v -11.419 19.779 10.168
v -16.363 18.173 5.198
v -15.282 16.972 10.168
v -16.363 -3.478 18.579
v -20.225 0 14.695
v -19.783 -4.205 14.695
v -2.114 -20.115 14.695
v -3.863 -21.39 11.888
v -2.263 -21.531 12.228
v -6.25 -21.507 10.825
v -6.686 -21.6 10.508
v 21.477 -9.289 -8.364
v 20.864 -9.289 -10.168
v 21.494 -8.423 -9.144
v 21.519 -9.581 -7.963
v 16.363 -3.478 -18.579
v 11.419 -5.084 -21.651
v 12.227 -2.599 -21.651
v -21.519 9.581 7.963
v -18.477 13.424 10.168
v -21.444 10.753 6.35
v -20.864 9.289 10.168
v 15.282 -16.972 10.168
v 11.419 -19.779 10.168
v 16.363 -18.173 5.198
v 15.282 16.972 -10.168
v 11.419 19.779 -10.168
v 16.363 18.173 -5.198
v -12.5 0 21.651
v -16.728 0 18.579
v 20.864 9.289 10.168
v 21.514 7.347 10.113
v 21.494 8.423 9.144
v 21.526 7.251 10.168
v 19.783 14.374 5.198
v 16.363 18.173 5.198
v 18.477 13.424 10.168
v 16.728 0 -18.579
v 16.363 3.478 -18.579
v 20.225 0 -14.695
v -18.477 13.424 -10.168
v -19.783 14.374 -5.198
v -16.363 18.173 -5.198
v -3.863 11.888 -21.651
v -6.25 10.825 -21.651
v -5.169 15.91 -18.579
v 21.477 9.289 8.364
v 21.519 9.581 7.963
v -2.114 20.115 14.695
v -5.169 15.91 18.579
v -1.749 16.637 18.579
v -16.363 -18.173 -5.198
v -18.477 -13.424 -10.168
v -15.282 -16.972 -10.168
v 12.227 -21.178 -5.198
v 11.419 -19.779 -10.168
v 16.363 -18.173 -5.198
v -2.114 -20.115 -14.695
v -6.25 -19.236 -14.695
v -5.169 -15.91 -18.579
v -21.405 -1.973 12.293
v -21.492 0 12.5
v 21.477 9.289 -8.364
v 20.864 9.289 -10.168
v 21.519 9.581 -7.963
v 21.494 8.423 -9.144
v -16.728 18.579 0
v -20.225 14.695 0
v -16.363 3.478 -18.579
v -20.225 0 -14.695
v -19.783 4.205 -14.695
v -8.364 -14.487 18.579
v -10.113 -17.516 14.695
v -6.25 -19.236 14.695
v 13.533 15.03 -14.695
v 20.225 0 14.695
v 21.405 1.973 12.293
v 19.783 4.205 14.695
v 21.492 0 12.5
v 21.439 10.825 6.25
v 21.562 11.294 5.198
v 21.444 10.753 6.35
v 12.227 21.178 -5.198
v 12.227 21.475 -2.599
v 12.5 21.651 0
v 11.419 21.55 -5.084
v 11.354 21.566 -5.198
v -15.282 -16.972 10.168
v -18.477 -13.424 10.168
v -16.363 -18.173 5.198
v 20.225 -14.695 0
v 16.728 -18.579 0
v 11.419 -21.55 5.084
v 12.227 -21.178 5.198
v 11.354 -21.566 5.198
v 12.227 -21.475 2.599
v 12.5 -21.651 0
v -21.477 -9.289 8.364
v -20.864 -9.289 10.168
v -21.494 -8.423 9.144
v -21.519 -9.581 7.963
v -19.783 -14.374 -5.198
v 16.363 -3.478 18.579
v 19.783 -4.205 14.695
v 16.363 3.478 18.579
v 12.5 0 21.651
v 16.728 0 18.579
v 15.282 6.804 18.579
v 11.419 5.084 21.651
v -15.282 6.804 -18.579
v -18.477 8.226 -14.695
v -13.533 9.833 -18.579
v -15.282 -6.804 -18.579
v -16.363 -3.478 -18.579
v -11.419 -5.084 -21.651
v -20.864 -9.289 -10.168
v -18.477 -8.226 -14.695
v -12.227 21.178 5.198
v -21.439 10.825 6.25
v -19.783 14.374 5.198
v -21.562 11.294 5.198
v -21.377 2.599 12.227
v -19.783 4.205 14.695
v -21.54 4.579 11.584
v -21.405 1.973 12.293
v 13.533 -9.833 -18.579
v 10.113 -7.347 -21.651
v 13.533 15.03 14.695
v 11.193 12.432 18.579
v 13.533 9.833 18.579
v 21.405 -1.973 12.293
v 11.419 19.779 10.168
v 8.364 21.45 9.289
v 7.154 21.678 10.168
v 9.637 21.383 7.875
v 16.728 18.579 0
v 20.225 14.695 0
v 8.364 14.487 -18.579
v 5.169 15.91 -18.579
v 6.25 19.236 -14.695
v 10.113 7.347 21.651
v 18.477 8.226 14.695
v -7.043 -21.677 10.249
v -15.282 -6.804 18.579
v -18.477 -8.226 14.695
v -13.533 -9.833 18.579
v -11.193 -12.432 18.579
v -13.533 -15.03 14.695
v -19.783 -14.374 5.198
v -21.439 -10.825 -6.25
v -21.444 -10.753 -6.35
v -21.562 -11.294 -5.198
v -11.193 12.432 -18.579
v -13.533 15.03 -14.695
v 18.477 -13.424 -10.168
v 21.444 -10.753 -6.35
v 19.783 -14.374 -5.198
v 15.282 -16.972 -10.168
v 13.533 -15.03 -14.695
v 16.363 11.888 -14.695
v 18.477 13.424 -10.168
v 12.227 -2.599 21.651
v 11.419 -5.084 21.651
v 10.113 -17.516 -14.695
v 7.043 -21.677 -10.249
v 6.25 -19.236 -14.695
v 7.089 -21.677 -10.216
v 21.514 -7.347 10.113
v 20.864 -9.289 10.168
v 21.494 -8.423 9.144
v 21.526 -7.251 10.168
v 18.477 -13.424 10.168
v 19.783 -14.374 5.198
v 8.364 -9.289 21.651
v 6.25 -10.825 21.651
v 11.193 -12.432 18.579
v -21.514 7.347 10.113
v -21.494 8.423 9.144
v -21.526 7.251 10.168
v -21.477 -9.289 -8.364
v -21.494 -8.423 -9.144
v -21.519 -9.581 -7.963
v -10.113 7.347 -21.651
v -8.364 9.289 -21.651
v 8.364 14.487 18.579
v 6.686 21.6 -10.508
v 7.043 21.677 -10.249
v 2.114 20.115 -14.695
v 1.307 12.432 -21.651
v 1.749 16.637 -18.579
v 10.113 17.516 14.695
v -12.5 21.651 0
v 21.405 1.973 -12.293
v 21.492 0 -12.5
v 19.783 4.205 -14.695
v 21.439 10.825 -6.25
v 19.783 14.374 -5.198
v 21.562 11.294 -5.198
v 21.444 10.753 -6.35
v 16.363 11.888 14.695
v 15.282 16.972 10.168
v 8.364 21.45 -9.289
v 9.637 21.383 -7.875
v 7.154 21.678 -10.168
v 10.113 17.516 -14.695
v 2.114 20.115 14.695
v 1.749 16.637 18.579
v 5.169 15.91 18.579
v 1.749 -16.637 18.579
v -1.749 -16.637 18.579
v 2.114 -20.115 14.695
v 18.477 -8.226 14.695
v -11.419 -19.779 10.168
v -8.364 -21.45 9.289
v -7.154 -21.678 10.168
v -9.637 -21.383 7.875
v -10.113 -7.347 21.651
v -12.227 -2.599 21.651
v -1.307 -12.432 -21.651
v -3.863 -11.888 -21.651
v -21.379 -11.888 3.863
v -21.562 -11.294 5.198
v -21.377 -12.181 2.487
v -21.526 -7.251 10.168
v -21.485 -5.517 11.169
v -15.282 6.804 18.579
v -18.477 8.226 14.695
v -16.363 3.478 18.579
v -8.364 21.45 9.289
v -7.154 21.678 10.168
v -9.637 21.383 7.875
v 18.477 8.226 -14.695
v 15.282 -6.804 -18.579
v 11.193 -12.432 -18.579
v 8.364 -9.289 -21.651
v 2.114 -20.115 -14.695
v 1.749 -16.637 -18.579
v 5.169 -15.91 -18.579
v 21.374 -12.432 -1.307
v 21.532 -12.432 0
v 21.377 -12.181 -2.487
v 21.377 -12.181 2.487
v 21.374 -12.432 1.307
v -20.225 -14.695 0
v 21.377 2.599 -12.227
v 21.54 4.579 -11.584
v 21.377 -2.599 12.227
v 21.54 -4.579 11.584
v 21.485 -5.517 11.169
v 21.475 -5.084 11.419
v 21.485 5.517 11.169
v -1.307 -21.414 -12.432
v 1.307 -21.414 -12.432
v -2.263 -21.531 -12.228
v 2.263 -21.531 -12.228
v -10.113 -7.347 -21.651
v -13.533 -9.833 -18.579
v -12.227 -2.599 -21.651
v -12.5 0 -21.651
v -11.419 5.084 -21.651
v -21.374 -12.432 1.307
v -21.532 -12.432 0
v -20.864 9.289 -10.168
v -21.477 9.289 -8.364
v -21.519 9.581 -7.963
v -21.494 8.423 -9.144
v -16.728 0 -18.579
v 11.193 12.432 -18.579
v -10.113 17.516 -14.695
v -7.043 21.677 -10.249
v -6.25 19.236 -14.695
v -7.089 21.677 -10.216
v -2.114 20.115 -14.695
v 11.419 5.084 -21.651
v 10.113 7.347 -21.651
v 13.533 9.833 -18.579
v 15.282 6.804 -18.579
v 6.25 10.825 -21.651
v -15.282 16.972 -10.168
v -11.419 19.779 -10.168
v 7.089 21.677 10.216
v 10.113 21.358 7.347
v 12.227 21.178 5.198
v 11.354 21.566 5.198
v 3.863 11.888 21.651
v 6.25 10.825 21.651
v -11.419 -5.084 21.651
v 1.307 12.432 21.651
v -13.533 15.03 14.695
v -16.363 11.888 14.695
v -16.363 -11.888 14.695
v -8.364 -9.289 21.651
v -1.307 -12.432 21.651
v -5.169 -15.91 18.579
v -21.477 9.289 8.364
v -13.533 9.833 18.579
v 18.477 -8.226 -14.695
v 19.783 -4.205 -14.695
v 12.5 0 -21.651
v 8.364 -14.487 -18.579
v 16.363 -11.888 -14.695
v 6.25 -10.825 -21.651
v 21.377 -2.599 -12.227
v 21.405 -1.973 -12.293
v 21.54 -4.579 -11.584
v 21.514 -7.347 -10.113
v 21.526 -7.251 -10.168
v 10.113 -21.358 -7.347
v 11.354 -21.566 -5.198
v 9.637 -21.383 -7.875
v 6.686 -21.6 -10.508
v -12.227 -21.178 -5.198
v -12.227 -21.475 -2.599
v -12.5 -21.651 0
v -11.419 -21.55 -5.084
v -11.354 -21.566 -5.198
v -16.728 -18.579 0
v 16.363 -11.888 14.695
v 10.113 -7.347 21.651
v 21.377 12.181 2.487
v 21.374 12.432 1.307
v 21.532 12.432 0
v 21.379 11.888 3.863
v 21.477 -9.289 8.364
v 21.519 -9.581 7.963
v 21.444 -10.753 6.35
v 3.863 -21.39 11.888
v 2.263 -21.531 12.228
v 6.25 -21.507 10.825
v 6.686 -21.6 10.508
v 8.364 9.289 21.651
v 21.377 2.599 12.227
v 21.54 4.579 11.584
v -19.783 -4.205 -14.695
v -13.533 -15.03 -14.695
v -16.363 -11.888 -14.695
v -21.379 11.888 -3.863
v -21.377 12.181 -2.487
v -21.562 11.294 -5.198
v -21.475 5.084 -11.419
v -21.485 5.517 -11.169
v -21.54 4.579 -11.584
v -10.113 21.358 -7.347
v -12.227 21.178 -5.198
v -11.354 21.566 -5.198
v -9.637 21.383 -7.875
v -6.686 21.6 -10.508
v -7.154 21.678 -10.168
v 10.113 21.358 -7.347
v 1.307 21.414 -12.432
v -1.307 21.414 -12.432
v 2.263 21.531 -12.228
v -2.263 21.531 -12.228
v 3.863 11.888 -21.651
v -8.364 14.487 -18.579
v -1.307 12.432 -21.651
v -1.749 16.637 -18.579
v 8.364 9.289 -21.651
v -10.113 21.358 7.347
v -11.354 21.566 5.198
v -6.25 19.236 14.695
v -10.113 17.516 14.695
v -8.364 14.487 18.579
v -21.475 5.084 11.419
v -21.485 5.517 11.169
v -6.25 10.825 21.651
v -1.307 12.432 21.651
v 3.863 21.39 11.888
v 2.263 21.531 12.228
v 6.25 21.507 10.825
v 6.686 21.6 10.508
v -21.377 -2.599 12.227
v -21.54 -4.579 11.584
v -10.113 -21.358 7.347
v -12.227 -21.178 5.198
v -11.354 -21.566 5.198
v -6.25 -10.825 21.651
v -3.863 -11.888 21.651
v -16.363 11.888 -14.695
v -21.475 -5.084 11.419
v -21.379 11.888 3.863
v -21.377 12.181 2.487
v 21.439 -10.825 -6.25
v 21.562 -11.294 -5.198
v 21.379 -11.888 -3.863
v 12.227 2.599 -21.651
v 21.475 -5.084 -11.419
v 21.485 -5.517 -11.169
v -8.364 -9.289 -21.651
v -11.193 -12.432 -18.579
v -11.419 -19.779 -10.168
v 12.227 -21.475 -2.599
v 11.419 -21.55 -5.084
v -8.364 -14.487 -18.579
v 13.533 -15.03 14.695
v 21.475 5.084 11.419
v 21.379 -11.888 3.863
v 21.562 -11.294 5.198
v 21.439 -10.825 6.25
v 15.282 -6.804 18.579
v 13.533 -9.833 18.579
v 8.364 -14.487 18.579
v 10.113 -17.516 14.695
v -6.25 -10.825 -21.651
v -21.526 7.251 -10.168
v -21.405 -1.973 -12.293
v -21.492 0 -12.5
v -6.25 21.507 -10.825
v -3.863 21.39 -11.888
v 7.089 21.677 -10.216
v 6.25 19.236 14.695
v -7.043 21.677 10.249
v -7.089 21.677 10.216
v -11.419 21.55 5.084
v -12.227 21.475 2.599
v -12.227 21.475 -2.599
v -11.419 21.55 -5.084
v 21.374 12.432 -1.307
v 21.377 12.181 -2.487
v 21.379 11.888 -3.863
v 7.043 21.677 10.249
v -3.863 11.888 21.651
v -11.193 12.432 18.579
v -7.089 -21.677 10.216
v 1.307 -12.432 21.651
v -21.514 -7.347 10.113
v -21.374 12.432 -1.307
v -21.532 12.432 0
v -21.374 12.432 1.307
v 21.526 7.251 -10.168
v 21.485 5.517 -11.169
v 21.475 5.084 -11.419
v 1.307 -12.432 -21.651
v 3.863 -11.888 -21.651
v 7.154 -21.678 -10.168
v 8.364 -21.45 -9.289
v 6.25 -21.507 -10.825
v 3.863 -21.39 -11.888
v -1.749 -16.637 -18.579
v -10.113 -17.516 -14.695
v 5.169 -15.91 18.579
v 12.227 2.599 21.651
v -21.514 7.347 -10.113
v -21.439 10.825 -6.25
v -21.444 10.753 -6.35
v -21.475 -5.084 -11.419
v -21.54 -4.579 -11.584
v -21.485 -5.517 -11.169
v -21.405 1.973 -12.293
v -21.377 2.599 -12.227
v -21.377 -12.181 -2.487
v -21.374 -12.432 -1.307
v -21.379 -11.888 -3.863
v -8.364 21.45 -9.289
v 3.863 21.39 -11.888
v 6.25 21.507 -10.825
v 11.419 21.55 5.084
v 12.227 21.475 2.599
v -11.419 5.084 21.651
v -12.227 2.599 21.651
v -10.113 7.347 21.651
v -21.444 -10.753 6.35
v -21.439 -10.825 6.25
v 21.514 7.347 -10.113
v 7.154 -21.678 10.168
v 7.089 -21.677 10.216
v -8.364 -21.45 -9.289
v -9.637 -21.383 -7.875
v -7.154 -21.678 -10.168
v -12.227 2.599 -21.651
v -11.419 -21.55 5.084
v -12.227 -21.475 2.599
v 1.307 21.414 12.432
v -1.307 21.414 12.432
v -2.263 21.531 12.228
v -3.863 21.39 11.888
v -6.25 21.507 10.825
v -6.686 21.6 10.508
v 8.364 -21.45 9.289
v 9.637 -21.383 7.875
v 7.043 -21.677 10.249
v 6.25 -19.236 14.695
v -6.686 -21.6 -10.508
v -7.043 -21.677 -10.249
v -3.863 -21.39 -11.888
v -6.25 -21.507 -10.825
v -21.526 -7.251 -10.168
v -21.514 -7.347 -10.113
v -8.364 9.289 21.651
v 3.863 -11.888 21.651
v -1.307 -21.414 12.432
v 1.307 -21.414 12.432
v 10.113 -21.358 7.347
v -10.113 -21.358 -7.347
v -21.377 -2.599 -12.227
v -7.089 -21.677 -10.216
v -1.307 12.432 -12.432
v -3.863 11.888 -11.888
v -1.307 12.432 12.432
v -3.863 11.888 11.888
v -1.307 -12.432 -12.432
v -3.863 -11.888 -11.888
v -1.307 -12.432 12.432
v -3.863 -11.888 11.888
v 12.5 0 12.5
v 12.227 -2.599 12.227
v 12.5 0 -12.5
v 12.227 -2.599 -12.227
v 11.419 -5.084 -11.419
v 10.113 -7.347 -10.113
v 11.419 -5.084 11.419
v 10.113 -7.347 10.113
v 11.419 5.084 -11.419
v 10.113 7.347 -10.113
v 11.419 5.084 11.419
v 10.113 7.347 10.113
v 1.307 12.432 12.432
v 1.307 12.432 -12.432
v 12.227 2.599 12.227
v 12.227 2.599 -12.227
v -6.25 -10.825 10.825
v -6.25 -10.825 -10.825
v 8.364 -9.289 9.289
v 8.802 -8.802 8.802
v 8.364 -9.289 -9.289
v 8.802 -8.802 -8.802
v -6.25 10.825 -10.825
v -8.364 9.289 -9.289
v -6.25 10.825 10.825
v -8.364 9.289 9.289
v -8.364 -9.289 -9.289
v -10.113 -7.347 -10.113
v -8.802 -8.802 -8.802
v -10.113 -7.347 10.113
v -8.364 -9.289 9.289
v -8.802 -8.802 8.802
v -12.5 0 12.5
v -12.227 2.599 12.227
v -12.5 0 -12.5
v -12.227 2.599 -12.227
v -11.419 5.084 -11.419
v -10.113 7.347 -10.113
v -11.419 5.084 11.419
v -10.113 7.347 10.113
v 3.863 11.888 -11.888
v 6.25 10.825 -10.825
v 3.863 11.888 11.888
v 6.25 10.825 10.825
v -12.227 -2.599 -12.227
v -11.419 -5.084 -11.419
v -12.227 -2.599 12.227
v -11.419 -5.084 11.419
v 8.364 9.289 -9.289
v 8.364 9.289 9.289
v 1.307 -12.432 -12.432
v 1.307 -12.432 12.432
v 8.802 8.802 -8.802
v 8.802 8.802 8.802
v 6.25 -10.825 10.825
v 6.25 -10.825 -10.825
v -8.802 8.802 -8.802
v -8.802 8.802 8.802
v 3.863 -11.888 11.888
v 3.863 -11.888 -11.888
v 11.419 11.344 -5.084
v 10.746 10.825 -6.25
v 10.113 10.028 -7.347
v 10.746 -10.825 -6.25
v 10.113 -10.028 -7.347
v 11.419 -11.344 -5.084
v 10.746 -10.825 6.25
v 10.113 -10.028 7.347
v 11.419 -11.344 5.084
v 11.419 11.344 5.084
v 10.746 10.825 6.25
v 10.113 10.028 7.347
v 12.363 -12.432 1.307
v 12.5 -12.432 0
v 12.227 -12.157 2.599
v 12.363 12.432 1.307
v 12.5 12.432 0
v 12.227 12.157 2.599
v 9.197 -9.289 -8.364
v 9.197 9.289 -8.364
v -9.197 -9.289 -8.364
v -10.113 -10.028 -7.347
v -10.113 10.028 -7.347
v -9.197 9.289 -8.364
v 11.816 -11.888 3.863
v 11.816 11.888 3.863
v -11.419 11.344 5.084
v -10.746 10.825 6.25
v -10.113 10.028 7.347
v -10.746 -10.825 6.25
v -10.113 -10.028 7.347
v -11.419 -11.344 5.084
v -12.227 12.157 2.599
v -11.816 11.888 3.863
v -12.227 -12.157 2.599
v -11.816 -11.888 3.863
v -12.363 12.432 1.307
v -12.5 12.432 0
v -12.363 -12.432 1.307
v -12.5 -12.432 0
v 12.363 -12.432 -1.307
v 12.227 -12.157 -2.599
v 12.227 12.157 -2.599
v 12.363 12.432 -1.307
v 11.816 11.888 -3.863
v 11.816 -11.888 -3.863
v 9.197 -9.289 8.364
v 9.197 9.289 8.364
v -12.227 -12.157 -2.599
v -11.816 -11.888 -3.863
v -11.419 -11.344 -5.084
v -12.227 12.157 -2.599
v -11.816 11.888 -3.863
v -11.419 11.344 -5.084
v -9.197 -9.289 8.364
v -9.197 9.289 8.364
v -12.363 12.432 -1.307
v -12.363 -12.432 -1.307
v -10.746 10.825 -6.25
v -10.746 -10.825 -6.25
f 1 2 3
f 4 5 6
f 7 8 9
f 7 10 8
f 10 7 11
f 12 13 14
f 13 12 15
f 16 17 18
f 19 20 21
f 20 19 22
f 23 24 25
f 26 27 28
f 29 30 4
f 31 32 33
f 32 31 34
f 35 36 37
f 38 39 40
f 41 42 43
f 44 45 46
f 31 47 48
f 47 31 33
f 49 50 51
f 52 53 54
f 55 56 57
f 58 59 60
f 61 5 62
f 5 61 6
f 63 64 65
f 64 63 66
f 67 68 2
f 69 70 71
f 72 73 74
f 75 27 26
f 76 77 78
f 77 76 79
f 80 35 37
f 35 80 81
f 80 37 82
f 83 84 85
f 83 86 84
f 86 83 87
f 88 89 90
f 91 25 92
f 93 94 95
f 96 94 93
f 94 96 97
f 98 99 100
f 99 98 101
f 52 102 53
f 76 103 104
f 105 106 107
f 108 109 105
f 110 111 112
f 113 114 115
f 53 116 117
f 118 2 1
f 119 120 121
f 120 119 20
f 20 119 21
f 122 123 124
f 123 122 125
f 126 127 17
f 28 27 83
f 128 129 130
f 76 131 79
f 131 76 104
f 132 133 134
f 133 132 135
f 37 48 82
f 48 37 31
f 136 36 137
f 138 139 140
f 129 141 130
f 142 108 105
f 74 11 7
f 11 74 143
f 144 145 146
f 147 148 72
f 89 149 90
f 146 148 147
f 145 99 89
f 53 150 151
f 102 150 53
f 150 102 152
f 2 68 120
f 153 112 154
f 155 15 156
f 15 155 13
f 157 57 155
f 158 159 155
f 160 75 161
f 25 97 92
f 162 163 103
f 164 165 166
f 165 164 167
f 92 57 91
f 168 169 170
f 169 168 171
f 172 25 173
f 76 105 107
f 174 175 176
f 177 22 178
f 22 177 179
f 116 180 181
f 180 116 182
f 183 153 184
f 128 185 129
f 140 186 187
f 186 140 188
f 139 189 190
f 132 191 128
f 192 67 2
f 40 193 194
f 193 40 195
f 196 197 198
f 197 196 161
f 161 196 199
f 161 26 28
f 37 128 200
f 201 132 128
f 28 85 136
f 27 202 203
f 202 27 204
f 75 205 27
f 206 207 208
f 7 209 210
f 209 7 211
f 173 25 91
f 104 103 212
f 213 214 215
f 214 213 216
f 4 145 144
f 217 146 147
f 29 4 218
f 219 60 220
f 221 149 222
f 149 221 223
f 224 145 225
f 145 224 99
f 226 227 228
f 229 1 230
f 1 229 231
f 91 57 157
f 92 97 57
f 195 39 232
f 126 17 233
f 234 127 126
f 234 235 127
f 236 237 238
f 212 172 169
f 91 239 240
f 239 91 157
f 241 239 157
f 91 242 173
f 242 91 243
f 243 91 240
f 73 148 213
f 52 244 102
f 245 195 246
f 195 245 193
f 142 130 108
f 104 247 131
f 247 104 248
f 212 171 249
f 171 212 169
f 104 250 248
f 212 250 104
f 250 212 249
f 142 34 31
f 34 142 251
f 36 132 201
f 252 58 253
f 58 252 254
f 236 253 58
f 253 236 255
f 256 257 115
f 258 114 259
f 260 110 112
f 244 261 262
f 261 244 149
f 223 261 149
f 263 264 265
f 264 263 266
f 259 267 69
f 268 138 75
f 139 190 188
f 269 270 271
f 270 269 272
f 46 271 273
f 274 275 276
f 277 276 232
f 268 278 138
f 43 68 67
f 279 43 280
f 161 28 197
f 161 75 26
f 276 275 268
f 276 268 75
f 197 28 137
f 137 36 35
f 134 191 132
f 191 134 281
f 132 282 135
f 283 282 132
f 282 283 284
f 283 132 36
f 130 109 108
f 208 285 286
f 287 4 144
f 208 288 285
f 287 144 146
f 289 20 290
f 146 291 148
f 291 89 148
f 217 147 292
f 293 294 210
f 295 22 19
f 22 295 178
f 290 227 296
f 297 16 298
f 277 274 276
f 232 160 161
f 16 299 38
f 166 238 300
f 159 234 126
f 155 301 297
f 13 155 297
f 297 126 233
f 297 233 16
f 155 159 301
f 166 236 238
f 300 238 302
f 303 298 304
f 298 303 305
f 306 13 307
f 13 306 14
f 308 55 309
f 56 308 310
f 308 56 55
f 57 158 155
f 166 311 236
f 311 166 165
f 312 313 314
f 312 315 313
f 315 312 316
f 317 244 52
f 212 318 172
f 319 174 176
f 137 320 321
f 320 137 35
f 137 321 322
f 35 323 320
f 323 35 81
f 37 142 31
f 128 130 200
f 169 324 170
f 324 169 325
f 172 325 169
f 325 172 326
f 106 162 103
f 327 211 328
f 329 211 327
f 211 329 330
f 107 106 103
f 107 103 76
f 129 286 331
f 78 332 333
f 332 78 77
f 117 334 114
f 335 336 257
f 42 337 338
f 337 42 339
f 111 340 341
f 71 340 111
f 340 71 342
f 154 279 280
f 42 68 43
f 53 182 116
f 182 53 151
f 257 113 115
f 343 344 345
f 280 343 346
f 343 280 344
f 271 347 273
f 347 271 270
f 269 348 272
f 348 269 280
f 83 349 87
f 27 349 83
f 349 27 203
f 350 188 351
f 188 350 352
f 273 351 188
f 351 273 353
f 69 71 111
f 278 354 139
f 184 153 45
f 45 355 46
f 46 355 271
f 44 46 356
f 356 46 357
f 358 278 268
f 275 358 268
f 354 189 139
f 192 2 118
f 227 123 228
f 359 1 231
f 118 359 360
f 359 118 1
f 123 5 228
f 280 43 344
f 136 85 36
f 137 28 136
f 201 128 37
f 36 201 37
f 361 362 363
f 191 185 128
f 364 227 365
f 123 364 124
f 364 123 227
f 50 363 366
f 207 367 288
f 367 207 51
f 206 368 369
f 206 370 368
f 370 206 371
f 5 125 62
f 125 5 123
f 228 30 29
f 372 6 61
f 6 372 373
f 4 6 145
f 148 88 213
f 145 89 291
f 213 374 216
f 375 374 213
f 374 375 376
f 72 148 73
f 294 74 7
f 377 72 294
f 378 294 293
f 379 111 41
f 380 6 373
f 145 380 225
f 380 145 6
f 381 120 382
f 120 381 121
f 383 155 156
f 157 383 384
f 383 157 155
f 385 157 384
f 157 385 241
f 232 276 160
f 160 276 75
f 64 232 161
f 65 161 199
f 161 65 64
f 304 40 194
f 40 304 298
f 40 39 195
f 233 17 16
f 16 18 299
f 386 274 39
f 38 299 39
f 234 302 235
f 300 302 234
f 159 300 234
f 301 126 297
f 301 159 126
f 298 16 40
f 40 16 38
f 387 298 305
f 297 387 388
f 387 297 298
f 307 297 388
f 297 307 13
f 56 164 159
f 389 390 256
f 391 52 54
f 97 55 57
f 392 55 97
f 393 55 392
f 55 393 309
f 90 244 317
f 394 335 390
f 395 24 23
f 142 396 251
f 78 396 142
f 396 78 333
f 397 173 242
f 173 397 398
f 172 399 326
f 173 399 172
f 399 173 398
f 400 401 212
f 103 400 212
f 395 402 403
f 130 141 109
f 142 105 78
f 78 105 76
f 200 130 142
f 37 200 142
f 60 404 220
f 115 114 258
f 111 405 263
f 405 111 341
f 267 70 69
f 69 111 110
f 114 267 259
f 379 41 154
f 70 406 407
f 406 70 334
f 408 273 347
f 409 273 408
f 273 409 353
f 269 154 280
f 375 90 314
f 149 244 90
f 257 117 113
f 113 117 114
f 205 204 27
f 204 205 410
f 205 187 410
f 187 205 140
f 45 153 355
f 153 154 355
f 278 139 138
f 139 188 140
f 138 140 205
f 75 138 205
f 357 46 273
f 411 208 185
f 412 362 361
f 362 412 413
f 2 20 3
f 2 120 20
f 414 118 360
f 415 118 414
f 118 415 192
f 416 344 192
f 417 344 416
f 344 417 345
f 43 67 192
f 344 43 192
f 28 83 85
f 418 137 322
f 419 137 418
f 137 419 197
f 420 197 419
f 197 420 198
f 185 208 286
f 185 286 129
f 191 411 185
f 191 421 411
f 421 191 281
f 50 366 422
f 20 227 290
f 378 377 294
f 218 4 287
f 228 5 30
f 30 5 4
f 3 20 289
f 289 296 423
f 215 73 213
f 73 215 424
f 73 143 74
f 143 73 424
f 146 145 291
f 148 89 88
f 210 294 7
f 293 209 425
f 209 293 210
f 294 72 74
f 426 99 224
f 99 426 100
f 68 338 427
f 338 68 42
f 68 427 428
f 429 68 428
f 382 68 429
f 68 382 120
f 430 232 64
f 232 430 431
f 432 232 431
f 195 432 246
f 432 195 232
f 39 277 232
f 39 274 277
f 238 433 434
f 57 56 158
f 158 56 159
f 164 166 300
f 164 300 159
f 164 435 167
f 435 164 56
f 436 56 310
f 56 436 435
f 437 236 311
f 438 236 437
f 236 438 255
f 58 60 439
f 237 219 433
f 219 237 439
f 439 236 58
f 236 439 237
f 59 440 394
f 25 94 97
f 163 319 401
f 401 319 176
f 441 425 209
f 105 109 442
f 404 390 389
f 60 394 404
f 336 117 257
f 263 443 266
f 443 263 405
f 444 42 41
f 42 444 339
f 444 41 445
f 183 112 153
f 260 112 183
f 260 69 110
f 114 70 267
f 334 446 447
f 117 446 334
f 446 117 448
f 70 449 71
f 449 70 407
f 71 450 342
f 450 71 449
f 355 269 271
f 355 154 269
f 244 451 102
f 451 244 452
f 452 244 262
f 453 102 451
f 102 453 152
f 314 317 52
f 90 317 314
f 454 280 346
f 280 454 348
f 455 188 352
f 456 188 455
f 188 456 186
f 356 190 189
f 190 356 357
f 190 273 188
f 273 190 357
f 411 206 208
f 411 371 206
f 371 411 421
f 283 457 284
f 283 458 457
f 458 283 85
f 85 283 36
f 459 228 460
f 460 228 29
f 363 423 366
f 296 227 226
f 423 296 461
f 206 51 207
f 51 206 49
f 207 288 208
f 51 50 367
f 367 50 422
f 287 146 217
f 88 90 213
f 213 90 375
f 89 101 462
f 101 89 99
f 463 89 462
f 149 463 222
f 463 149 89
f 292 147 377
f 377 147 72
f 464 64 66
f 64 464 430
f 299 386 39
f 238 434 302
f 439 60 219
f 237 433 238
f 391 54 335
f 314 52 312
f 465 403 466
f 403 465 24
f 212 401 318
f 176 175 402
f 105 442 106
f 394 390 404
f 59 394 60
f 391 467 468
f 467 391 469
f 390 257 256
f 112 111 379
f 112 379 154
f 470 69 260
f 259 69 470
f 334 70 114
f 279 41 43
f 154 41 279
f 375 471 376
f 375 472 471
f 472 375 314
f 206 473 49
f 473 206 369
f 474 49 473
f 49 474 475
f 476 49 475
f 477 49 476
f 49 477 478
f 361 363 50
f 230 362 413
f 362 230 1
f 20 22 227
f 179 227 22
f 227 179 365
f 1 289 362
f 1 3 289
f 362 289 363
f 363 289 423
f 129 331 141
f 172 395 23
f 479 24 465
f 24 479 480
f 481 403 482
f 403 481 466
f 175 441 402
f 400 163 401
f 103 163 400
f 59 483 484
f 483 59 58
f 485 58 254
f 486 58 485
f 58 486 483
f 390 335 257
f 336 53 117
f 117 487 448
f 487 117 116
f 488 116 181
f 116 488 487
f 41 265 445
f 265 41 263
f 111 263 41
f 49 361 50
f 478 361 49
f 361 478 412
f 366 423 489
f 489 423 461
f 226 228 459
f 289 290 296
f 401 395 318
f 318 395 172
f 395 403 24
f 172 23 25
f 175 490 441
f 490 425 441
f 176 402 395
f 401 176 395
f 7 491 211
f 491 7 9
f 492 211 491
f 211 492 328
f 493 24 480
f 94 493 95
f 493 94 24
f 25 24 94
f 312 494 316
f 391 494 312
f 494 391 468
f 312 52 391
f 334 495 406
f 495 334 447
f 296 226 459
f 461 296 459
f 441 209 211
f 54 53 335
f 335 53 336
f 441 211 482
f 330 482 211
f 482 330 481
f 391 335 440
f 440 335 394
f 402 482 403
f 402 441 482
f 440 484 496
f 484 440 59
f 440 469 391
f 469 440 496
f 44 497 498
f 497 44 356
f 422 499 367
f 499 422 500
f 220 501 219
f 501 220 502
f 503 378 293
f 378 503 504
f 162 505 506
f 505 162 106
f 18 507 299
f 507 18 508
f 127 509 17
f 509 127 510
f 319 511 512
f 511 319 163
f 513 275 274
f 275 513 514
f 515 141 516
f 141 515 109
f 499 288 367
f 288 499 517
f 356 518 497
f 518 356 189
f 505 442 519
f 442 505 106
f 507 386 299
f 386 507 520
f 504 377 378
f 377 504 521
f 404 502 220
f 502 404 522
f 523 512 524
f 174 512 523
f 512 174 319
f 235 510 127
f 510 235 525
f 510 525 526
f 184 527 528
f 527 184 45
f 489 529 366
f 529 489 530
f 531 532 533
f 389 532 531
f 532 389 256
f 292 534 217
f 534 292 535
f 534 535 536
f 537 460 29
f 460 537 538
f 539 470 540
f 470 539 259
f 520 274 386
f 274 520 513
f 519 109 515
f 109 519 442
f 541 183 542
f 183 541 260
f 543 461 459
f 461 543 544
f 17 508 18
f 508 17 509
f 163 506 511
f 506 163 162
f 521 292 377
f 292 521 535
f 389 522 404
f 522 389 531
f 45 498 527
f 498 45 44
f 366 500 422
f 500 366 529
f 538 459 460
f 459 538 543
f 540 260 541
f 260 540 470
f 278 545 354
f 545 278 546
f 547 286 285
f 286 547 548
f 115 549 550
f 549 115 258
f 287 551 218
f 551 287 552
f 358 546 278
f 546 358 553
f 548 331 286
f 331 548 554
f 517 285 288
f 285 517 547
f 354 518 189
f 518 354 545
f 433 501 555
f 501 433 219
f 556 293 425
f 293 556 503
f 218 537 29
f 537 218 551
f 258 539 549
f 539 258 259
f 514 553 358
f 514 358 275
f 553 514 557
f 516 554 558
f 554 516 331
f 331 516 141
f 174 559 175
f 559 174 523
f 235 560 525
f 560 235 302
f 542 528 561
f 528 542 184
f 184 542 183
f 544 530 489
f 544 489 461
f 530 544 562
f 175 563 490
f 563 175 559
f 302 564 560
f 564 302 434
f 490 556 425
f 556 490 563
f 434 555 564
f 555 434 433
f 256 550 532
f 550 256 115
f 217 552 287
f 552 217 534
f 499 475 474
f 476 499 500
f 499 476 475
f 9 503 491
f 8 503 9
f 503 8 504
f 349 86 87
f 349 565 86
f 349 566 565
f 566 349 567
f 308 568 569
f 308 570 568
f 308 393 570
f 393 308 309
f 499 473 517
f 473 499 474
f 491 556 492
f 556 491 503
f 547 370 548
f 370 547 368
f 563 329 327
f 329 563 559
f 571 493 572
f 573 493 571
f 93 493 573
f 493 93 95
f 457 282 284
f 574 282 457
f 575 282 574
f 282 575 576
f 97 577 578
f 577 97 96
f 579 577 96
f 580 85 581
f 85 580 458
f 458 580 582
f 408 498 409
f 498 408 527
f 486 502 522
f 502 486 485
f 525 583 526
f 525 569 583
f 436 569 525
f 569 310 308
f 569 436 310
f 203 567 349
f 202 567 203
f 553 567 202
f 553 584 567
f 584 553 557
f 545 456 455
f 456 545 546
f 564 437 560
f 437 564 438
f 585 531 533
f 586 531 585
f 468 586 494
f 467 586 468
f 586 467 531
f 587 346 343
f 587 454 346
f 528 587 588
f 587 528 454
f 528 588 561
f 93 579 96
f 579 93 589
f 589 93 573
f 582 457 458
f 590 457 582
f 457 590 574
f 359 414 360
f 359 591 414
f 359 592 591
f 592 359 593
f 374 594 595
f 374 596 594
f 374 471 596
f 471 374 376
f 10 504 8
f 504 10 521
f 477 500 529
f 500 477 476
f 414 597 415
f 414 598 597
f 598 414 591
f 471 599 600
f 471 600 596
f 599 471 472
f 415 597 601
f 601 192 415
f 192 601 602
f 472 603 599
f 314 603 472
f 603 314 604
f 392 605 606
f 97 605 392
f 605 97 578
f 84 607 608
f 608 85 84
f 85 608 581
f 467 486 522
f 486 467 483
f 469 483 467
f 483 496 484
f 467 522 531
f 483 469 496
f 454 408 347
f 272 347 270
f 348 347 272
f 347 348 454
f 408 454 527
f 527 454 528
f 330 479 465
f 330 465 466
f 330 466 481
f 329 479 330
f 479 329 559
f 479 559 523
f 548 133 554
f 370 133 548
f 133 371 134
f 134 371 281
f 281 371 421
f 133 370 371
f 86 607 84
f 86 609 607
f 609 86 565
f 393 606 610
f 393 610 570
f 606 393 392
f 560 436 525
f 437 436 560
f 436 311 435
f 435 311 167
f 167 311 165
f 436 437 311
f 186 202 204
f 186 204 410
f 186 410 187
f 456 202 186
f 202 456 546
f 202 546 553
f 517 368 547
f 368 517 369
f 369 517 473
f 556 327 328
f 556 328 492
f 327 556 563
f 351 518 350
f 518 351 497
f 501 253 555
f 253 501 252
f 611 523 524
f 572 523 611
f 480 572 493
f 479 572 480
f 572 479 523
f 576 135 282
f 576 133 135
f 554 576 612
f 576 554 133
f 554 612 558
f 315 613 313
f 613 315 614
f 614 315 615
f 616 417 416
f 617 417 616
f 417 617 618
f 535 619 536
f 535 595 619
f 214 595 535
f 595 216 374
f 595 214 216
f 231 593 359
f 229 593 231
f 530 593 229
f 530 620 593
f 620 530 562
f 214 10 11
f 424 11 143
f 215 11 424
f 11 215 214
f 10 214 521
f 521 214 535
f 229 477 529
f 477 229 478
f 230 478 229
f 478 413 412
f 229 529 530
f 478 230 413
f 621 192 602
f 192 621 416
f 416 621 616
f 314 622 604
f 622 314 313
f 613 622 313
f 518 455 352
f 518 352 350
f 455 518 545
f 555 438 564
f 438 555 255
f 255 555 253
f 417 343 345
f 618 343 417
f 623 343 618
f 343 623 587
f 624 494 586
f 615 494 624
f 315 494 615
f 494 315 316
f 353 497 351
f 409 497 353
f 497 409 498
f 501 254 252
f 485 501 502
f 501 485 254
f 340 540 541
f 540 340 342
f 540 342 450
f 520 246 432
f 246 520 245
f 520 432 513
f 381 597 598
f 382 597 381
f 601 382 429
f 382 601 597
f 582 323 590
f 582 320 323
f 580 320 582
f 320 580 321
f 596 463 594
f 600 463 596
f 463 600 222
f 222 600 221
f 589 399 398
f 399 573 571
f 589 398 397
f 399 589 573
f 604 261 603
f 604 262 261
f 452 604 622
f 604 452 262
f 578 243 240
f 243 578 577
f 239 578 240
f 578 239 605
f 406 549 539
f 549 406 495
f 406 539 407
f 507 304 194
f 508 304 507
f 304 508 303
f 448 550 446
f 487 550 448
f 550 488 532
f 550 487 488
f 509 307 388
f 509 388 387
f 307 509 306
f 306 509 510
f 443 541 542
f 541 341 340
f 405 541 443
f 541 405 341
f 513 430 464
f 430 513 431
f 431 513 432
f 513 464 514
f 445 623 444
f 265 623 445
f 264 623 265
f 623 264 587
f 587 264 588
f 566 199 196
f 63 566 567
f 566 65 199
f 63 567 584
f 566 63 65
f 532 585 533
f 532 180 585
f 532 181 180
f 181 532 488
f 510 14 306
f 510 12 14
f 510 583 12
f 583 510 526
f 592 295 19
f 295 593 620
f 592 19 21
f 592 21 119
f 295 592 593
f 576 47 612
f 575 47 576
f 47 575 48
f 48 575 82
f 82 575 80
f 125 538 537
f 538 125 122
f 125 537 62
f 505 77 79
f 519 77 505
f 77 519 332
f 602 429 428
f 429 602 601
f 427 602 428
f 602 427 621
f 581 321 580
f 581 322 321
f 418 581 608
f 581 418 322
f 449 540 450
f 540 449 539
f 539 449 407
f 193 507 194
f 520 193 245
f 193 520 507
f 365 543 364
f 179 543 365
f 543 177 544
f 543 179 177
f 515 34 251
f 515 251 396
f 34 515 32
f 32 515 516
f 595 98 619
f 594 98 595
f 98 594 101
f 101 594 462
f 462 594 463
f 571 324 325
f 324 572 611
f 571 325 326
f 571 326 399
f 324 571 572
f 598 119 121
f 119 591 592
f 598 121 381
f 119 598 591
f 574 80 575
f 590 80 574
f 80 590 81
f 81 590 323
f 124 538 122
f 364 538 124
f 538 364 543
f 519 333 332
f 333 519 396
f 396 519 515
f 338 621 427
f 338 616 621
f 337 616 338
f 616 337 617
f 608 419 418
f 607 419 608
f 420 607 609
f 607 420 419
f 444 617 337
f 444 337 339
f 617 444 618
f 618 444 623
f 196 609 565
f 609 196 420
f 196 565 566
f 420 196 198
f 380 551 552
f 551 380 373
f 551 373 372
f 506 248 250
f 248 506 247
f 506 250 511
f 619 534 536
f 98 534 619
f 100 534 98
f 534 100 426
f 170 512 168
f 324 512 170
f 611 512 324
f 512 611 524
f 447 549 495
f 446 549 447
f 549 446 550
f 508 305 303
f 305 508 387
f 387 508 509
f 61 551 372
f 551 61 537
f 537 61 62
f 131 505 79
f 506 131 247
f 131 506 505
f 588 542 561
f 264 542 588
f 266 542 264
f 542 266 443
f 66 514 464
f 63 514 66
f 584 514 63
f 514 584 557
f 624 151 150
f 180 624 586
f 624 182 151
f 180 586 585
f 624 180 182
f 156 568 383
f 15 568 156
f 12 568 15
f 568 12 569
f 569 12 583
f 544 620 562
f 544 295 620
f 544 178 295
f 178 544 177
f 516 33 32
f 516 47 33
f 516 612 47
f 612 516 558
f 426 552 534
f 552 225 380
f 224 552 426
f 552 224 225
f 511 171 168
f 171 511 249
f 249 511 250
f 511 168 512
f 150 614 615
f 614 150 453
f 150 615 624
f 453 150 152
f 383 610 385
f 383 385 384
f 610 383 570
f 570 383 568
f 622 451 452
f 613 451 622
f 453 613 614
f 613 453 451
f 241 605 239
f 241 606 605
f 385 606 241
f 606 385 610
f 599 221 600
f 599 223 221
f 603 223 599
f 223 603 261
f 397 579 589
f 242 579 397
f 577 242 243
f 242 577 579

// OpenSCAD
// [FL_INDEX: keywords="openscad, 3d_parametric, Yucheng___s_Cool_Ball, csg_solid" | COT="Parametric OpenSCAD design from 3DCodeverse"]
// Title: Yuchengâ€˜s Cool Ball


module example001()
{
	function r_from_dia(d) = d / 2;

	module rotcy(rot, r, h) {
		rotate(90, rot)
			cylinder(r = r, h = h, center = true);
	}

	difference() {
		sphere(r = r_from_dia(size));
		rotcy([0, 0, 0], cy_r, cy_h);
		rotcy([1, 0, 0], cy_r, cy_h);
		rotcy([0, 1, 0], cy_r, cy_h);
	}

	size = 50;
	hole = 25;

	cy_r = r_from_dia(hole);
	cy_h = r_from_dia(size * 2.5);
}

example001();
